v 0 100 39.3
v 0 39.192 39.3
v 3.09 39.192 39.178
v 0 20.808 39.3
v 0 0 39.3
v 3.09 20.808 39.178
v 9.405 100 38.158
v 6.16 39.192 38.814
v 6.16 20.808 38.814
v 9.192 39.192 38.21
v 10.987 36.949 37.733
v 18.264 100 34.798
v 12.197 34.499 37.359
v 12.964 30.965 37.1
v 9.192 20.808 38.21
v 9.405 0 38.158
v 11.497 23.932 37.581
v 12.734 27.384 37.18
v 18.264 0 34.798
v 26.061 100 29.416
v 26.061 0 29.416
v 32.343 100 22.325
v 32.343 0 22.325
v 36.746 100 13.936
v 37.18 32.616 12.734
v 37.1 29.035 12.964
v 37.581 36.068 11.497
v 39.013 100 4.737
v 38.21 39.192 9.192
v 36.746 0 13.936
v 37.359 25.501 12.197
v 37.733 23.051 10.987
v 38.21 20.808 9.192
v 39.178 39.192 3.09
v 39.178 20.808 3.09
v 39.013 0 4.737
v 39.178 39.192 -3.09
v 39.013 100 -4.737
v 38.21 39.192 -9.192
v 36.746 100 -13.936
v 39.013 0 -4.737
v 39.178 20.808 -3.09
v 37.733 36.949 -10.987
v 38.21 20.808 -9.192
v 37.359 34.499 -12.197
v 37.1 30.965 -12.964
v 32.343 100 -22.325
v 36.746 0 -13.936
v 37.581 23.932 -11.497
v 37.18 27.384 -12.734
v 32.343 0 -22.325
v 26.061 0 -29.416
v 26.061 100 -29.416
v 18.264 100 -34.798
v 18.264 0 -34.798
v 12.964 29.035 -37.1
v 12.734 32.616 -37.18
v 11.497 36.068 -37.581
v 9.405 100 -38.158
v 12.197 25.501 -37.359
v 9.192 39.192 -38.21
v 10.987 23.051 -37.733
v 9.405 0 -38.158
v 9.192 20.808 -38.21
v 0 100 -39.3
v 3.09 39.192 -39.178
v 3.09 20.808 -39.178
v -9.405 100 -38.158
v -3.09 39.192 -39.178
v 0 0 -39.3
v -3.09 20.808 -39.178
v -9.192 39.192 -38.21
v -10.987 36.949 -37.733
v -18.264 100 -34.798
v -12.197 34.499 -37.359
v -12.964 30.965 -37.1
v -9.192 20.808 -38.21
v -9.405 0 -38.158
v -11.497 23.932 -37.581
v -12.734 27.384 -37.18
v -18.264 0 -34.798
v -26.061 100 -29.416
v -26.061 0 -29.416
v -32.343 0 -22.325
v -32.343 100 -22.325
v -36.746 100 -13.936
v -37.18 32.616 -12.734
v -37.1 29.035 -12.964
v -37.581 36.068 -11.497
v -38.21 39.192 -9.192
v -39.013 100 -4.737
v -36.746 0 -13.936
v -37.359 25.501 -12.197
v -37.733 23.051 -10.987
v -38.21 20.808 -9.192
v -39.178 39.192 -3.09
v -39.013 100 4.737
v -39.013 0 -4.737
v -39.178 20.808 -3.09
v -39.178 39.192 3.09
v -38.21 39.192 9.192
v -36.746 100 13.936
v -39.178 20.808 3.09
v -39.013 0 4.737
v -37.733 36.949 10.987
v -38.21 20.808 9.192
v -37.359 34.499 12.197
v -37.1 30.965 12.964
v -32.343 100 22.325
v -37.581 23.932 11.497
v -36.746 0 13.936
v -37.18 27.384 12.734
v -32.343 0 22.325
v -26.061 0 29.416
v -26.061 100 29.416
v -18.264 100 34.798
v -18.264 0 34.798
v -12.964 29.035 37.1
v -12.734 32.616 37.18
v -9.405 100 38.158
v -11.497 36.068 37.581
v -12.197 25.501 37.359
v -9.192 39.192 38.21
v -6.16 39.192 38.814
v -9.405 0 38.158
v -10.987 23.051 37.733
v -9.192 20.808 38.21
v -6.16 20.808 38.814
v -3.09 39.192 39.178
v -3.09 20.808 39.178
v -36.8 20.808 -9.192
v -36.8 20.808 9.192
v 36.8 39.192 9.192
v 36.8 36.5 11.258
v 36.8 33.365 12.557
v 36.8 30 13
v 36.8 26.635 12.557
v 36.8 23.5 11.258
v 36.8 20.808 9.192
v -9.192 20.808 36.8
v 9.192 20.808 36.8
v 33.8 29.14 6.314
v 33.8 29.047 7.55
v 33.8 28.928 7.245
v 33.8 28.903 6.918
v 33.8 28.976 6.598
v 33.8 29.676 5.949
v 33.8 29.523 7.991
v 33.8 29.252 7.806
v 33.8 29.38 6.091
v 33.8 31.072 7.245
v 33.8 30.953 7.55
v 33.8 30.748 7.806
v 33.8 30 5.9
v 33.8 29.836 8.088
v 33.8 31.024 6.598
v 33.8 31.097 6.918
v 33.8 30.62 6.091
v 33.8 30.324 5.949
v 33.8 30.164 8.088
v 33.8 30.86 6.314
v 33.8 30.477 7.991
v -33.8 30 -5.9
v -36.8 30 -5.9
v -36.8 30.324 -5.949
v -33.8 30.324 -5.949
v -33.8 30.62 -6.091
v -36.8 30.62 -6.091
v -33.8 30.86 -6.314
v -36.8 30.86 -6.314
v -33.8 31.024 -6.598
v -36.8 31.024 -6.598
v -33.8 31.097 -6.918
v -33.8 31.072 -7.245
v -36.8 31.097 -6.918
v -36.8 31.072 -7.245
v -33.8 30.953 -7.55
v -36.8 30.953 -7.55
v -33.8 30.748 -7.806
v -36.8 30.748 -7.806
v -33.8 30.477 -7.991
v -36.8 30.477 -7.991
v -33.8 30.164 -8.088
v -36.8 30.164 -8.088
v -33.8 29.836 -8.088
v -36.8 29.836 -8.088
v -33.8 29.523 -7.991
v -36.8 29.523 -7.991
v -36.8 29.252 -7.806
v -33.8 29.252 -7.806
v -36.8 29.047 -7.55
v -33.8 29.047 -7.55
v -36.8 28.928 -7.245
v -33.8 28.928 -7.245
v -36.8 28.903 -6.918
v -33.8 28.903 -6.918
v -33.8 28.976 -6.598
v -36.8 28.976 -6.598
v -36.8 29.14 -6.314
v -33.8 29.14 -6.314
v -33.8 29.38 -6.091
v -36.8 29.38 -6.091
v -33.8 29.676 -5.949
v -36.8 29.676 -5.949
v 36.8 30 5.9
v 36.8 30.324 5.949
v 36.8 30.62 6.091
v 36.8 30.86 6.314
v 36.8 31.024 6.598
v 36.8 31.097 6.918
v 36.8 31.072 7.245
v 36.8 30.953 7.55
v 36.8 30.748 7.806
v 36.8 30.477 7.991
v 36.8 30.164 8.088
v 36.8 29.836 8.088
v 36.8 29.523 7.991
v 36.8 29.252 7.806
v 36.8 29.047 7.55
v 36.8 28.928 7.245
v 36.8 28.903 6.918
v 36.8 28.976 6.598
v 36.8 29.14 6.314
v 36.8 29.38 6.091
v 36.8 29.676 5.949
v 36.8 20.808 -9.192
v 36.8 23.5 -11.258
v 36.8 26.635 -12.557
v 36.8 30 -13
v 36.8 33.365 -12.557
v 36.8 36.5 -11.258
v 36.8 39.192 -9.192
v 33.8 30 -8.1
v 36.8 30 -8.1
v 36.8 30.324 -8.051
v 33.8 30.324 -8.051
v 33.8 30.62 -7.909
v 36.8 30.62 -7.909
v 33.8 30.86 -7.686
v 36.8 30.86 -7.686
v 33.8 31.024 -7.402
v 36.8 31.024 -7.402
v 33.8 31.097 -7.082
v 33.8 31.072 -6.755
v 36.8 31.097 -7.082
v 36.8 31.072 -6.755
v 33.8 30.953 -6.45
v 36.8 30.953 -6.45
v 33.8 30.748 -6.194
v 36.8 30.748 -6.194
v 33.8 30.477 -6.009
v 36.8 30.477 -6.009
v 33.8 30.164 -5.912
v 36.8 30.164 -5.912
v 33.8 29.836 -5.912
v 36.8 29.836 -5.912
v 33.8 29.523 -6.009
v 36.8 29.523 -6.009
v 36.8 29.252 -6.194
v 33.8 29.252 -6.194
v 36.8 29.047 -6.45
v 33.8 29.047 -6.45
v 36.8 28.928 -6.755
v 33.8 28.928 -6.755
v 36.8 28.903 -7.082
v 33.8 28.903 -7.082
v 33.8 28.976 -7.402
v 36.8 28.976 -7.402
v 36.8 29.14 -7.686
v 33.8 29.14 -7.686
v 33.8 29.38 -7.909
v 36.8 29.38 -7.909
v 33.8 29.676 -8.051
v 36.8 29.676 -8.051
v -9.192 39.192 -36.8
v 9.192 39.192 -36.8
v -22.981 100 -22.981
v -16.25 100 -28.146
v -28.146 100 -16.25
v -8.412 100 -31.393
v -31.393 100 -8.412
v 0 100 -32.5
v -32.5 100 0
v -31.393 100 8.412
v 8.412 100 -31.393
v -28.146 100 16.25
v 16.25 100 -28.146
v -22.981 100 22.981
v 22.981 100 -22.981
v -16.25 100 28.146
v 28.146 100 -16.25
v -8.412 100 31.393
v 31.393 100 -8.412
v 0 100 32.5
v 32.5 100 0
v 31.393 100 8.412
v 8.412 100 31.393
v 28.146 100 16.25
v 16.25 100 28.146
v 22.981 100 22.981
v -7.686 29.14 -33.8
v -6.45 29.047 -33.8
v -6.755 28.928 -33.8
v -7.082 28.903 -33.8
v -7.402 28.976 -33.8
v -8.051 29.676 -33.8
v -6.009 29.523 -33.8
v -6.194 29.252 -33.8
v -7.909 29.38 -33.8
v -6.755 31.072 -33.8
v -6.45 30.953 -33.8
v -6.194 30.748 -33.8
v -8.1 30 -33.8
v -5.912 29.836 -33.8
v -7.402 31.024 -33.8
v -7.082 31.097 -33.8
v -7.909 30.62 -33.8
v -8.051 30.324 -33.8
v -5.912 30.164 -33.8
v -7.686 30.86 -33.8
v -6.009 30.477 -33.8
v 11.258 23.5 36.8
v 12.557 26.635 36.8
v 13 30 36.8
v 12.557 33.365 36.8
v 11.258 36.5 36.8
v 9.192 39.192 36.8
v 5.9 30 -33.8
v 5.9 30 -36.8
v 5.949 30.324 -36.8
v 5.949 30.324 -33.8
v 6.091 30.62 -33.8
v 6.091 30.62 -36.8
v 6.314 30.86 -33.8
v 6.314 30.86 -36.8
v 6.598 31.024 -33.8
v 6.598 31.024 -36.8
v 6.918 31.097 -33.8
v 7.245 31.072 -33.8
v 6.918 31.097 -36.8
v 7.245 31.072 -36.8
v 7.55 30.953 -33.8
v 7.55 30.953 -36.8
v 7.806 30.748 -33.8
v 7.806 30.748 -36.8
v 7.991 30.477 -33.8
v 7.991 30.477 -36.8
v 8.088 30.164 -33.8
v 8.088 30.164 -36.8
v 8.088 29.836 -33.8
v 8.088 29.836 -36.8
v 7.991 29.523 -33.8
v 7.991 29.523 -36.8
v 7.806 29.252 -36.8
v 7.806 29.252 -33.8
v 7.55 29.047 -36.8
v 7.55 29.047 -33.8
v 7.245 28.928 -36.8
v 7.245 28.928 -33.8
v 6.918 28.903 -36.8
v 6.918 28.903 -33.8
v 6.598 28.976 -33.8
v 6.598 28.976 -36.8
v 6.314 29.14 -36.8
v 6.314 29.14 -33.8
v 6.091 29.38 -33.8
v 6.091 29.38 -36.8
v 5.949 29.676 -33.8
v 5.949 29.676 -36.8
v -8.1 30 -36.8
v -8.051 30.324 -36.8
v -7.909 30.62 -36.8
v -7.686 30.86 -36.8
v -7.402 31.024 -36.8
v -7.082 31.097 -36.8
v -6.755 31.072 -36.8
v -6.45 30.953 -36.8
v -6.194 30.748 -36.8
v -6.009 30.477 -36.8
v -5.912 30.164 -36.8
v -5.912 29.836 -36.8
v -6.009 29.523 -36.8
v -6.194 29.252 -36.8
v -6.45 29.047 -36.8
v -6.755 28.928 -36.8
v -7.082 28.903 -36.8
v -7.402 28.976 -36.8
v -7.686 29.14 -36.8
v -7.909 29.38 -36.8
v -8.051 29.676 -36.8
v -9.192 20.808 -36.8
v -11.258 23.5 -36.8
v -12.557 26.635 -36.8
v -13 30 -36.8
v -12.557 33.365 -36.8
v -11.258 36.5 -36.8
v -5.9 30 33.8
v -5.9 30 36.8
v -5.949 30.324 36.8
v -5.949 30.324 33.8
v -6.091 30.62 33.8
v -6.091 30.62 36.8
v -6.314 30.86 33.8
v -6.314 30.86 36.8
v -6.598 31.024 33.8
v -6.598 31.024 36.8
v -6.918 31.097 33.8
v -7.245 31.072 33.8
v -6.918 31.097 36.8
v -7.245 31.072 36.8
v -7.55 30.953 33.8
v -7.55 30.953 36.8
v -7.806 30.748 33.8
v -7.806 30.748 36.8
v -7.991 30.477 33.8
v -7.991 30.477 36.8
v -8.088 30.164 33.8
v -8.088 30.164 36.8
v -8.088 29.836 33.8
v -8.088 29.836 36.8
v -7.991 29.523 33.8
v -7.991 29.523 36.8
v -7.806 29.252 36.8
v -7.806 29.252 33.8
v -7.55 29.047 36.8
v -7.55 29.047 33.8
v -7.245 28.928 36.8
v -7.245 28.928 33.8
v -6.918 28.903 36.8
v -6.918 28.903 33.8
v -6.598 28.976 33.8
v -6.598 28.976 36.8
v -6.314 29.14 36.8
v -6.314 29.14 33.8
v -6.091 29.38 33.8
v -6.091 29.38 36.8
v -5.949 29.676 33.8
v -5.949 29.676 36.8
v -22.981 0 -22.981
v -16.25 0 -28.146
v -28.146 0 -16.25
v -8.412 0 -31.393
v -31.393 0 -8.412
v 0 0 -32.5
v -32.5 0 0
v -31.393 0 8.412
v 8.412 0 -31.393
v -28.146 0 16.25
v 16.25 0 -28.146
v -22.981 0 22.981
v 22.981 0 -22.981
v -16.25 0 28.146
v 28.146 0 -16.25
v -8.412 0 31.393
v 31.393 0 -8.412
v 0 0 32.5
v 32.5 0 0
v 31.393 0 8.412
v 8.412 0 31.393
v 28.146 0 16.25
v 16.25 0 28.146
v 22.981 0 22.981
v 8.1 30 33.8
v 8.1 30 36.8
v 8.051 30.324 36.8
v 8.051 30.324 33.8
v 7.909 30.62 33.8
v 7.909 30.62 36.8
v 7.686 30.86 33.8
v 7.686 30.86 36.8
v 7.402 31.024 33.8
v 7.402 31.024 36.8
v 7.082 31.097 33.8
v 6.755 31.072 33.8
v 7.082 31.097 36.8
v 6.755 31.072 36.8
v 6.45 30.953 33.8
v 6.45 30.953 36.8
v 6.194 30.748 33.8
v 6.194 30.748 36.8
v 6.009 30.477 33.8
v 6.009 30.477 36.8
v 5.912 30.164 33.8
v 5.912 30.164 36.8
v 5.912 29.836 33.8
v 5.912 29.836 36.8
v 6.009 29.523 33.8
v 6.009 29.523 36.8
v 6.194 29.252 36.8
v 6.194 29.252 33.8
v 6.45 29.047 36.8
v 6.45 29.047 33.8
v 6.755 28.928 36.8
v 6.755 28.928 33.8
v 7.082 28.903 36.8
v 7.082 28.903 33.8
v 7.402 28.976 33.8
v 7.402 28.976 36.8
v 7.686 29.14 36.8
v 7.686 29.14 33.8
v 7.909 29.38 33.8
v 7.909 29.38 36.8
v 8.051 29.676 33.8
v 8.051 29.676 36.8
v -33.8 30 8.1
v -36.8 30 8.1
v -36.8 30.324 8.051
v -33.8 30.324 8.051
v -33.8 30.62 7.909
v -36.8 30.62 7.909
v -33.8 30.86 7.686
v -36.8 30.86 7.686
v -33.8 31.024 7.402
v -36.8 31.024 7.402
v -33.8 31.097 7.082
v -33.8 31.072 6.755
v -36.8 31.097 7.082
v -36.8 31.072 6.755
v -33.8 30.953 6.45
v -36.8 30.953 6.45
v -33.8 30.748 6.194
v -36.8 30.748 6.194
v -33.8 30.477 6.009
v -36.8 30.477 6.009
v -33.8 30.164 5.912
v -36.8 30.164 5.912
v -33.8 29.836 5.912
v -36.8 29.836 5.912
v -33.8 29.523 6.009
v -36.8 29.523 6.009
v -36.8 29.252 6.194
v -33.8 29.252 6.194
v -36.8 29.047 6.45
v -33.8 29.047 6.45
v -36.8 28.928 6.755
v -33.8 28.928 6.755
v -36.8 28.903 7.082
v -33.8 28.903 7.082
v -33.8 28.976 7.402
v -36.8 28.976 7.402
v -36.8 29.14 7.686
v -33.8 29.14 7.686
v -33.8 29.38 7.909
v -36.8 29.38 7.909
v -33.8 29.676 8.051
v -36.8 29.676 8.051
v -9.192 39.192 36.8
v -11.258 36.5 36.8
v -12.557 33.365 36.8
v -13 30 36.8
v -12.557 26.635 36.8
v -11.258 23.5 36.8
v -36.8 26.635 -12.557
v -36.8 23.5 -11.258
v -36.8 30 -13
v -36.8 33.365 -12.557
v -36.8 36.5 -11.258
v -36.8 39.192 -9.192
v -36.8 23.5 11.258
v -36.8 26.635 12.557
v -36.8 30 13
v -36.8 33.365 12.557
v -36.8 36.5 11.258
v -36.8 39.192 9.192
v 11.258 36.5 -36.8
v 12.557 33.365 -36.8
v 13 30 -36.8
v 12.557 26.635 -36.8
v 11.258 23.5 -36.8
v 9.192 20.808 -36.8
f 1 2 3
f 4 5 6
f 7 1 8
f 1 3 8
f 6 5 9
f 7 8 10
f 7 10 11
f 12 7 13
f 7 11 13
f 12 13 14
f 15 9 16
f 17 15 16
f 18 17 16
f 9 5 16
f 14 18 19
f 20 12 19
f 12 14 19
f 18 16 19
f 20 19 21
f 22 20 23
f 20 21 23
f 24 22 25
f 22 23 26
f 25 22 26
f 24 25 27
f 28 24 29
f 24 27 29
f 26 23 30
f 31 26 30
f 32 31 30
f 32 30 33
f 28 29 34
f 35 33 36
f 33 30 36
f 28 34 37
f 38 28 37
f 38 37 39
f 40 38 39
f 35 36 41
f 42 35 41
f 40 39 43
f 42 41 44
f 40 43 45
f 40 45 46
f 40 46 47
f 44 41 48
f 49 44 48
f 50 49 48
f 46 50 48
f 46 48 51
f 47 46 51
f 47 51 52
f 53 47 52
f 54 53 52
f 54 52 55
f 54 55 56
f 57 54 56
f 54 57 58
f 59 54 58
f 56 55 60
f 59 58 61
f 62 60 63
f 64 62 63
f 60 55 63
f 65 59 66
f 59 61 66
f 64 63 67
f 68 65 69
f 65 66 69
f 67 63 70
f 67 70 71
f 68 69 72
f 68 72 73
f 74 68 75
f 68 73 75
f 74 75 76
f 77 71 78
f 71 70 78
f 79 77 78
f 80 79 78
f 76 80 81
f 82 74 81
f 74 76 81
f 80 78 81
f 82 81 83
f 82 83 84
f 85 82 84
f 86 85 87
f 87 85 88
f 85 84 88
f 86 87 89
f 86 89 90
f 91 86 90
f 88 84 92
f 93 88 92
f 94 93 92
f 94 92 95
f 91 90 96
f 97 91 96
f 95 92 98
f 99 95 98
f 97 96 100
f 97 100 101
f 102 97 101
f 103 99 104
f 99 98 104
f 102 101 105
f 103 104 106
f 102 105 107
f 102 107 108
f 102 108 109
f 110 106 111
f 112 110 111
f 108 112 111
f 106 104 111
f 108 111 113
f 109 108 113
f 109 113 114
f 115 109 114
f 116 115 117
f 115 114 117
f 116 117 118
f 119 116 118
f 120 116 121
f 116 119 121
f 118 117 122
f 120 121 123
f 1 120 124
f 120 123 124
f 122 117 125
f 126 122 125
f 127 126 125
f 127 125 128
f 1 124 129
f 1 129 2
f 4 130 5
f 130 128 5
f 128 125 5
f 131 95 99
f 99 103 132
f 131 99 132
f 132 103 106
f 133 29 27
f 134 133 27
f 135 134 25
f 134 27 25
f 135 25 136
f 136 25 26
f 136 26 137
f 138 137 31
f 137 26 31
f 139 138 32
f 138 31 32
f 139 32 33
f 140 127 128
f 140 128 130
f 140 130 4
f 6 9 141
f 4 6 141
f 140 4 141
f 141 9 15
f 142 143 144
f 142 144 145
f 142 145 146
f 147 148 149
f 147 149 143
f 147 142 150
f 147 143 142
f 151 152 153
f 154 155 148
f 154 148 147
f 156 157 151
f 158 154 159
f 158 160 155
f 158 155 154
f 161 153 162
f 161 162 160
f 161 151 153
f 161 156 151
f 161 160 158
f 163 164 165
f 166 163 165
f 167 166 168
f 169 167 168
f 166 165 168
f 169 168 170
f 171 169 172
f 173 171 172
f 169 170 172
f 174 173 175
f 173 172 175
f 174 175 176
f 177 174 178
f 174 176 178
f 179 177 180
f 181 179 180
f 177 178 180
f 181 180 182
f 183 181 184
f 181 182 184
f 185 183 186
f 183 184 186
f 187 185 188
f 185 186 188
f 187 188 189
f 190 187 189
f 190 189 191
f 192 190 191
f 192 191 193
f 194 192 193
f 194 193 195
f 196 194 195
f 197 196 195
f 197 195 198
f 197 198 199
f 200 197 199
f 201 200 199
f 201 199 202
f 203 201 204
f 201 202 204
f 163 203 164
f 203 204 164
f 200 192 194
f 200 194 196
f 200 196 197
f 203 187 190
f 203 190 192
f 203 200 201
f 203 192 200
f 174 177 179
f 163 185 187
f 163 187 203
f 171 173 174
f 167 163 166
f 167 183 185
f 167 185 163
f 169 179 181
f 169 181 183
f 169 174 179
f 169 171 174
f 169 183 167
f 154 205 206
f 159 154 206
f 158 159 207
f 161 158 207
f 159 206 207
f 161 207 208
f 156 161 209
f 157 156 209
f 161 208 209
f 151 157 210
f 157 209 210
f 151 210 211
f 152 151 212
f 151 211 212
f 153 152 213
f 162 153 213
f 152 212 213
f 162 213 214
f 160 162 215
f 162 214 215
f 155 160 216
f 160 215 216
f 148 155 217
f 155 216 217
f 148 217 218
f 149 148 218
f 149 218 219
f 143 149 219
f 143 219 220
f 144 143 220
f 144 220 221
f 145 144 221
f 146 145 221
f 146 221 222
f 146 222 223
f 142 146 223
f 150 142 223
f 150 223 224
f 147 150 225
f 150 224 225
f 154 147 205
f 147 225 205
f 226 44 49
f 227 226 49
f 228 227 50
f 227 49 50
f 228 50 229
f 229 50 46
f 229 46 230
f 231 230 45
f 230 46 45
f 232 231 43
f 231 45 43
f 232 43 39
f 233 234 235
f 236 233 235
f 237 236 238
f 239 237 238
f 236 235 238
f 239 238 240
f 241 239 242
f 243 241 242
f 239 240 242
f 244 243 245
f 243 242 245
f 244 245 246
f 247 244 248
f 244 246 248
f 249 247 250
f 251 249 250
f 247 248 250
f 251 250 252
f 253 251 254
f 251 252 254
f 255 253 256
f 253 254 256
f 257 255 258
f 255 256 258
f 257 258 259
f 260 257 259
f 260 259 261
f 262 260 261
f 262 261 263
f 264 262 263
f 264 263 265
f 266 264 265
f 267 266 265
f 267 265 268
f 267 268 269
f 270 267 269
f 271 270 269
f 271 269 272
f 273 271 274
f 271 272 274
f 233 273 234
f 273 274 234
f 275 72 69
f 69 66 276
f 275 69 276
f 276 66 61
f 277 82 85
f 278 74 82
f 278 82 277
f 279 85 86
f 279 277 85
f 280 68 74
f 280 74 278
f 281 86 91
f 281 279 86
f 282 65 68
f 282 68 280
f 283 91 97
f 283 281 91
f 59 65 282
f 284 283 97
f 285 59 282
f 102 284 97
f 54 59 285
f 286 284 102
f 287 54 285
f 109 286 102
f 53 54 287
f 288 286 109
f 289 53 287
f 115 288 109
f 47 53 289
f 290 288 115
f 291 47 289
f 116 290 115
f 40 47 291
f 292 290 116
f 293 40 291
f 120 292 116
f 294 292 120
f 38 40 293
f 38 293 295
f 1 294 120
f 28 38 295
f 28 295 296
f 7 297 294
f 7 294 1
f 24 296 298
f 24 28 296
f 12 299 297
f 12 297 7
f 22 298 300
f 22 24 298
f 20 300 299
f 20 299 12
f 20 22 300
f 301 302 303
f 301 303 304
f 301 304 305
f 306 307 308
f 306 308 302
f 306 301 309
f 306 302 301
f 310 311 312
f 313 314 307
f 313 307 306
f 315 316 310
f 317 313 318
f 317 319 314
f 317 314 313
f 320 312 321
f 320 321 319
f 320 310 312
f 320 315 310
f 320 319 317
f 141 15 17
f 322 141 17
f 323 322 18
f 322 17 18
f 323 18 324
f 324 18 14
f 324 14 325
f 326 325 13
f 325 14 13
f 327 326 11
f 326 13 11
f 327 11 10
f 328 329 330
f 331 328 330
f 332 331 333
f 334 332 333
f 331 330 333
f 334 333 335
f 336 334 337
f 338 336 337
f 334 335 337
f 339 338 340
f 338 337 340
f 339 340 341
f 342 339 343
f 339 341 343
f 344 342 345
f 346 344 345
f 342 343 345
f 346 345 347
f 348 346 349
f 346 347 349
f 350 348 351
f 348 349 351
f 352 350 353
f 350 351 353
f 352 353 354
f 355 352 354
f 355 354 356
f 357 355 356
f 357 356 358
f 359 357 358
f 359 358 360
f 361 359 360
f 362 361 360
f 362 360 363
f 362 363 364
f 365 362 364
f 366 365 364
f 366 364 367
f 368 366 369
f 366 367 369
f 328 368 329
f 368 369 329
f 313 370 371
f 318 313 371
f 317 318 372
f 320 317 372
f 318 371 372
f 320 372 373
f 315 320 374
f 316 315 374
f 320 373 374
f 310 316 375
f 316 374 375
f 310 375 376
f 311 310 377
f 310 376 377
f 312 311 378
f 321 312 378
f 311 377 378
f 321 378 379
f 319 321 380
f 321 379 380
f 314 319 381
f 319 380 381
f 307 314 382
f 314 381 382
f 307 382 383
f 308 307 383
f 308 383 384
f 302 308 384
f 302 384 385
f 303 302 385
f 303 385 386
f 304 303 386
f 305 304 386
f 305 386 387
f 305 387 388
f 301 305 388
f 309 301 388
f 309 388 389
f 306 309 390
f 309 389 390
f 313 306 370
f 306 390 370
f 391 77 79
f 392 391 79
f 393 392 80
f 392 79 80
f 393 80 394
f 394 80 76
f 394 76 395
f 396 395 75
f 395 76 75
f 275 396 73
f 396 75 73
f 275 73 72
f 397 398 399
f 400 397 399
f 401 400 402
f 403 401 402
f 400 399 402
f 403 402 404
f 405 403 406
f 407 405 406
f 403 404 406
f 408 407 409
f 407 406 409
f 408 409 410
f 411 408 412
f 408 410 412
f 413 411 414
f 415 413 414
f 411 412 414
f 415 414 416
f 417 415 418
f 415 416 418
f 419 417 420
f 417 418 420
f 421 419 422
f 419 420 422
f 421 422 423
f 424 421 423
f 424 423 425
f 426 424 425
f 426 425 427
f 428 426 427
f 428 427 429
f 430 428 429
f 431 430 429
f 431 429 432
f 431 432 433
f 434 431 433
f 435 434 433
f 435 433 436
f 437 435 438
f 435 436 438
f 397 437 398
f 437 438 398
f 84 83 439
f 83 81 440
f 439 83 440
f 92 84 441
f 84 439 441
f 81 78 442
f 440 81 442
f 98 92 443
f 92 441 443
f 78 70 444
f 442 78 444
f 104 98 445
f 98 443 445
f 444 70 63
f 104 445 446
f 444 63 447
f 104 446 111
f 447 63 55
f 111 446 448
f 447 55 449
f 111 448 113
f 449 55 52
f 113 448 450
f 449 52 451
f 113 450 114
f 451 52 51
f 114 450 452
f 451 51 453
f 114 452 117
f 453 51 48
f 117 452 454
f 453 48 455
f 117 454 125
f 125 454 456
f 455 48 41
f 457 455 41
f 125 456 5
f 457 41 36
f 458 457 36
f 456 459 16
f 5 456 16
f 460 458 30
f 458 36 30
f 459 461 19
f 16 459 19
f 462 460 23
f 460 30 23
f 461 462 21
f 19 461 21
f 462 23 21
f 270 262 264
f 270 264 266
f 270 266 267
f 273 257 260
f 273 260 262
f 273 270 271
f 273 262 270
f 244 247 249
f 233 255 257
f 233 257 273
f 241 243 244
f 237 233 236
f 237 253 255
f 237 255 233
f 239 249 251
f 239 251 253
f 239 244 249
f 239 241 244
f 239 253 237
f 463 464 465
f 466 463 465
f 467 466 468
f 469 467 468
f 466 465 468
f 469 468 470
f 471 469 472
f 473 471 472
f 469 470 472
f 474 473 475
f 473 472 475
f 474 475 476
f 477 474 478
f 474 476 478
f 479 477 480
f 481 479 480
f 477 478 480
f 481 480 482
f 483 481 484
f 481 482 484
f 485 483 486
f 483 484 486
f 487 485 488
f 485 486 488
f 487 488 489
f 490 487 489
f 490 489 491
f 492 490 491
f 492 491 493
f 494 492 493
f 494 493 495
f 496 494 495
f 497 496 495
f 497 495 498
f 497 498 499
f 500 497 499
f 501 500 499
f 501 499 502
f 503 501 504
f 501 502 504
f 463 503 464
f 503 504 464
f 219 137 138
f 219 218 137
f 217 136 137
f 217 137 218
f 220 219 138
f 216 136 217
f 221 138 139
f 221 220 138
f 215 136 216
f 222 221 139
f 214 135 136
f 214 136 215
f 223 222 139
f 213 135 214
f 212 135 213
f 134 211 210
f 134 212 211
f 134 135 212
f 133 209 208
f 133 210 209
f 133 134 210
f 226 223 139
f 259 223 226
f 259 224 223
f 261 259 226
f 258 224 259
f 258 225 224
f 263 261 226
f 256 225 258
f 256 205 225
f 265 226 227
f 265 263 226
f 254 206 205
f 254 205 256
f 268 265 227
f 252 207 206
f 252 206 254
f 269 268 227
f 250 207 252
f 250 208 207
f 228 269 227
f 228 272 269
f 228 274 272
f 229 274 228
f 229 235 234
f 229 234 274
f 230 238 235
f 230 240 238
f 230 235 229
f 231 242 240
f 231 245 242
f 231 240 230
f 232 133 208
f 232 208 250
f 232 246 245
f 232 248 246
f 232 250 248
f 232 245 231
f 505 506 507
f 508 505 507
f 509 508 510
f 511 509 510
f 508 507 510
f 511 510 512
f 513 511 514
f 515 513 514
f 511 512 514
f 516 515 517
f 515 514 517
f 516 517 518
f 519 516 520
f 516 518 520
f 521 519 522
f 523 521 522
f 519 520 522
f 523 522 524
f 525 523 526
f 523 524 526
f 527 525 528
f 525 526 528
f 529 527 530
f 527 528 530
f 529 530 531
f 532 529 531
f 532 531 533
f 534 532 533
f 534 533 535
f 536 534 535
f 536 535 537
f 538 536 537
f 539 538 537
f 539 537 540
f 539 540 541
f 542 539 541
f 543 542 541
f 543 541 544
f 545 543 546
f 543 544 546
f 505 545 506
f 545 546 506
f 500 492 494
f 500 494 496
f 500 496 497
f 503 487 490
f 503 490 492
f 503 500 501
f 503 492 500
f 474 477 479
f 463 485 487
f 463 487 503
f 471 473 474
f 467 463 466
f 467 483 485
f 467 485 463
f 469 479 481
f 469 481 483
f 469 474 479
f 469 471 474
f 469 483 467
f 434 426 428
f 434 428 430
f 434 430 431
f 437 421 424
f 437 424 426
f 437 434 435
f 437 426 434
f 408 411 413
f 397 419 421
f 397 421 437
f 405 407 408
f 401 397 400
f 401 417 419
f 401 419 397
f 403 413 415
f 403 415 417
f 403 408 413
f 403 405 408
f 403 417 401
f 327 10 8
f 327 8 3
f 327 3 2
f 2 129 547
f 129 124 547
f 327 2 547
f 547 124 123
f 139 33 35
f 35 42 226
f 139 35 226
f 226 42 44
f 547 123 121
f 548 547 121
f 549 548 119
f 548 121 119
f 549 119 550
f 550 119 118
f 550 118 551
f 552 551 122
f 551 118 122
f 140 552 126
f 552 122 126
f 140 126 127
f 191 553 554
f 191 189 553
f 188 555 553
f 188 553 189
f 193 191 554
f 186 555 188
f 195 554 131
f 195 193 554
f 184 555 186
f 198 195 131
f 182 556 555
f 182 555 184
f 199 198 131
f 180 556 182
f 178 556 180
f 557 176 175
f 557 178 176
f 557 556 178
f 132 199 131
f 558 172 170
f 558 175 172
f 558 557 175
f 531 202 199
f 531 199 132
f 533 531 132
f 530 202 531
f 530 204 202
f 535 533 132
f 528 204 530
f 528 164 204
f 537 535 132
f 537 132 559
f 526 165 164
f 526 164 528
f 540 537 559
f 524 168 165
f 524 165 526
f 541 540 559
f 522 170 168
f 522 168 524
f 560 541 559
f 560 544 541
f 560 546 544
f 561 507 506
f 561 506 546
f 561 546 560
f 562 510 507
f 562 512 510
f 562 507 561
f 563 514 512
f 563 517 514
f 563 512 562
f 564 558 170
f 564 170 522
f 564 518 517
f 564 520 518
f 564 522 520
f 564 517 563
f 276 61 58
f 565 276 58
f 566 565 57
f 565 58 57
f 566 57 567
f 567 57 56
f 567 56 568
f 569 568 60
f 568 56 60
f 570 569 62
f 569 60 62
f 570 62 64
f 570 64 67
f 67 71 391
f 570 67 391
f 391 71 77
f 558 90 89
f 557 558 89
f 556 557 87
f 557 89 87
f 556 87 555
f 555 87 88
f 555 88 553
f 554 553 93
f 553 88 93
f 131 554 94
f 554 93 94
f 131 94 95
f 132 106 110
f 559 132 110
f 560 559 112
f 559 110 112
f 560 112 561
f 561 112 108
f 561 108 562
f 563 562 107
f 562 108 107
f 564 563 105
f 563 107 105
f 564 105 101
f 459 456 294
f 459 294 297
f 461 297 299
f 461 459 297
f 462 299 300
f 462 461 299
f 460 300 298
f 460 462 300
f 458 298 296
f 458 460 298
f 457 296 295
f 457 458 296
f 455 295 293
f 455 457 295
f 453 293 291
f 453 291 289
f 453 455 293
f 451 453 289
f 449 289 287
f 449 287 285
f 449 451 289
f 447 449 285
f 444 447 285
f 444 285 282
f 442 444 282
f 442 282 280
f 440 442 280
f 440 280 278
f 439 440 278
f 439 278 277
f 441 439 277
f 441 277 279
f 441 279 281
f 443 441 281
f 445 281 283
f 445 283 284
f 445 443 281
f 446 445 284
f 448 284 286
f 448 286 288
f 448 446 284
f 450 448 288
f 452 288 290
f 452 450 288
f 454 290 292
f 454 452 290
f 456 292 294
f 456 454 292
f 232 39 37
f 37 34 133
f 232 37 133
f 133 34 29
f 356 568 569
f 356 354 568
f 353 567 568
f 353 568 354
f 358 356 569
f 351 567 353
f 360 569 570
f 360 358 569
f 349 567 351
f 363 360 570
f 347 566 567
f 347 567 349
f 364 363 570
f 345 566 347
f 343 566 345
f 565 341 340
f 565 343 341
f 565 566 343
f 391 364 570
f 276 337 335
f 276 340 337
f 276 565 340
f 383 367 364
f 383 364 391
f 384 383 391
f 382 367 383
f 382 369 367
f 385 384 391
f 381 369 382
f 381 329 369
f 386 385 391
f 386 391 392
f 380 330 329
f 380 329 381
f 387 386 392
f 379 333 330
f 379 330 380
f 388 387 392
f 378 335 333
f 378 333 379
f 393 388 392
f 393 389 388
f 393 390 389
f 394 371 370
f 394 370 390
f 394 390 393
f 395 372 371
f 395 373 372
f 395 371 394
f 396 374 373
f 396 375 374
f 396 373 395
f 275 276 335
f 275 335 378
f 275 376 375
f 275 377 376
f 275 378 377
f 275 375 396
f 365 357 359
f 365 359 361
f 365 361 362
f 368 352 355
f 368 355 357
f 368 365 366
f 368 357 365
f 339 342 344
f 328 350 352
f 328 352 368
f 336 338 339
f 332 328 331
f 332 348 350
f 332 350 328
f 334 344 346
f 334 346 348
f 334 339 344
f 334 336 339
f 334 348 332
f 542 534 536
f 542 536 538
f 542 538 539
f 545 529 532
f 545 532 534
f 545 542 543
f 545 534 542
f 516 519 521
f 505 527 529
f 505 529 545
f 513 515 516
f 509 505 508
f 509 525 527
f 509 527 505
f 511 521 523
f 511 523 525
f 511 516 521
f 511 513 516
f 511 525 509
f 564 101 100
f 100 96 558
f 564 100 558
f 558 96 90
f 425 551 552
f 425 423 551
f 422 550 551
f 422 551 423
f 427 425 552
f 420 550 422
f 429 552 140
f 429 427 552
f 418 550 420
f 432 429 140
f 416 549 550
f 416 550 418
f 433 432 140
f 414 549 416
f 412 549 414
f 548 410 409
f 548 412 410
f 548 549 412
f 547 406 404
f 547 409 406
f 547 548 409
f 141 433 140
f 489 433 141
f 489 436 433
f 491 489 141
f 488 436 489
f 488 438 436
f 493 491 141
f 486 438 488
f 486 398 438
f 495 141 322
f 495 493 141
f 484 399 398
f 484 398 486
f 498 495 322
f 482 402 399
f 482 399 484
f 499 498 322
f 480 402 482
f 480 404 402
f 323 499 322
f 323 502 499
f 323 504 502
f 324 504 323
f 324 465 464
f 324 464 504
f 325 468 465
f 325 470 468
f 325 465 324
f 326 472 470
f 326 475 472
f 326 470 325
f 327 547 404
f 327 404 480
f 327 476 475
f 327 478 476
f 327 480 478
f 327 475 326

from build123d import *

# Parameters (mm, degrees)
SKETCH2_R           = 39.3
SKETCH2_R_2         = 32.5
BOSS_EXTRUDE1_DEPTH = 100
CUT_EXTRUDE1_START  = 39.3
CUT_EXTRUDE1_DEPTH  = 2.5
SKETCH4_R           = 1.1
CUT_EXTRUDE2_DEPTH  = 3
CIRPATTERN1_COUNT   = 4


with BuildPart() as part:
    # Sketch2 → Boss-Extrude1 (new body)
    with BuildSketch(Plane(origin=(0, 0, 0), x_dir=(1, 0, 0), z_dir=(0, 1, 0))):
        Circle(SKETCH2_R)
        Circle(SKETCH2_R_2, mode=Mode.SUBTRACT)
    extrude(amount=BOSS_EXTRUDE1_DEPTH)

    # Sketch3 → Cut-Extrude1 (cut)
    with BuildSketch(Plane.XY.offset(CUT_EXTRUDE1_START)):
        with BuildLine():
            Line((9.192388155, 39.192388155), (-9.192388155, 39.192388155))
            ThreePointArc((-9.192388155, 39.192388155), (-13, 30), (-9.192388155, 20.807611845))
            Line((-9.192388155, 20.807611845), (9.192388155, 20.807611845))
            ThreePointArc((9.192388155, 20.807611845), (13, 30), (9.192388155, 39.192388155))
        make_face()
    cut_extrude1 = extrude(amount=-CUT_EXTRUDE1_DEPTH, mode=Mode.SUBTRACT)

    # Sketch4 → Cut-Extrude2 (cut)
    with BuildSketch(Plane.XY.offset(36.8)):
        with Locations((7, 30)):
            Circle(SKETCH4_R)
        with Locations((-7, 30)):
            Circle(SKETCH4_R)
    cut_extrude2 = extrude(amount=-CUT_EXTRUDE2_DEPTH, mode=Mode.SUBTRACT)

    # CirPattern1: Cut-Extrude1, Cut-Extrude2 ×4 about axis
    cirpattern1_axis = Axis((0, 100, 0), (0, -1, 0))
    add([cut_extrude1.rotate(cirpattern1_axis, i * 360 / CIRPATTERN1_COUNT) for i in range(1, CIRPATTERN1_COUNT)], mode=Mode.SUBTRACT)
    add([cut_extrude2.rotate(cirpattern1_axis, i * 360 / CIRPATTERN1_COUNT) for i in range(1, CIRPATTERN1_COUNT)], mode=Mode.SUBTRACT)


solid = part.part
